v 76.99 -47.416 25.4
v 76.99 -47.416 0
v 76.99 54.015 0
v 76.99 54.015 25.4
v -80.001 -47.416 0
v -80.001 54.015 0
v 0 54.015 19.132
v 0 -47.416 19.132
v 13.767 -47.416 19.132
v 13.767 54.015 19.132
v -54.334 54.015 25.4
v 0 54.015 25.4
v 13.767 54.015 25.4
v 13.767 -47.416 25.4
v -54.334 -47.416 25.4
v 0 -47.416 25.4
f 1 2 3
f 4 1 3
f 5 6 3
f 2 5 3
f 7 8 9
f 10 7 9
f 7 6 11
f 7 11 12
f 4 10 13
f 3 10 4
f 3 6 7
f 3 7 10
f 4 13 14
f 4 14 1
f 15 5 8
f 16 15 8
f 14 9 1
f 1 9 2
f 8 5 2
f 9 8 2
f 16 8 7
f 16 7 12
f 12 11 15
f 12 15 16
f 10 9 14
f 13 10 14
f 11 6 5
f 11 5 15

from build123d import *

# Parameters (mm, degrees)
F0_W     = 156.9909751415
F0_H     = 101.4308109879
F1_DEPTH = 25.4
F3_DEPTH = 127.8210822493
F4_W     = 13.7669481337
F4_H     = 6.2678030968
F5_DEPTH = 157.0622399449


with BuildPart() as f1:
    # F0 (on Top) → F1 (new body)
    with BuildSketch(Plane.XY):
        with Locations((-1.5058219433, 3.2995529473)):
            Rectangle(F0_W, F0_H)
    extrude(amount=F1_DEPTH)

    # F2 (on face) → F3 (cut)
    with BuildSketch(Plane.XZ.offset(47.4158525467)):
        Polygon((-80.001309514, 25.4), (-80.001309514, 0), (-54.3336644769, 25.4), align=None)
    extrude(amount=-F3_DEPTH, mode=Mode.SUBTRACT)

    # F4 (on face) → F5 (cut)
    with BuildSketch(Plane.XZ.offset(47.4158525467)):
        with Locations((6.8834740669, 22.2660984516)):
            Rectangle(F4_W, F4_H)
    extrude(amount=-F5_DEPTH, mode=Mode.SUBTRACT)


solid = f1.part
